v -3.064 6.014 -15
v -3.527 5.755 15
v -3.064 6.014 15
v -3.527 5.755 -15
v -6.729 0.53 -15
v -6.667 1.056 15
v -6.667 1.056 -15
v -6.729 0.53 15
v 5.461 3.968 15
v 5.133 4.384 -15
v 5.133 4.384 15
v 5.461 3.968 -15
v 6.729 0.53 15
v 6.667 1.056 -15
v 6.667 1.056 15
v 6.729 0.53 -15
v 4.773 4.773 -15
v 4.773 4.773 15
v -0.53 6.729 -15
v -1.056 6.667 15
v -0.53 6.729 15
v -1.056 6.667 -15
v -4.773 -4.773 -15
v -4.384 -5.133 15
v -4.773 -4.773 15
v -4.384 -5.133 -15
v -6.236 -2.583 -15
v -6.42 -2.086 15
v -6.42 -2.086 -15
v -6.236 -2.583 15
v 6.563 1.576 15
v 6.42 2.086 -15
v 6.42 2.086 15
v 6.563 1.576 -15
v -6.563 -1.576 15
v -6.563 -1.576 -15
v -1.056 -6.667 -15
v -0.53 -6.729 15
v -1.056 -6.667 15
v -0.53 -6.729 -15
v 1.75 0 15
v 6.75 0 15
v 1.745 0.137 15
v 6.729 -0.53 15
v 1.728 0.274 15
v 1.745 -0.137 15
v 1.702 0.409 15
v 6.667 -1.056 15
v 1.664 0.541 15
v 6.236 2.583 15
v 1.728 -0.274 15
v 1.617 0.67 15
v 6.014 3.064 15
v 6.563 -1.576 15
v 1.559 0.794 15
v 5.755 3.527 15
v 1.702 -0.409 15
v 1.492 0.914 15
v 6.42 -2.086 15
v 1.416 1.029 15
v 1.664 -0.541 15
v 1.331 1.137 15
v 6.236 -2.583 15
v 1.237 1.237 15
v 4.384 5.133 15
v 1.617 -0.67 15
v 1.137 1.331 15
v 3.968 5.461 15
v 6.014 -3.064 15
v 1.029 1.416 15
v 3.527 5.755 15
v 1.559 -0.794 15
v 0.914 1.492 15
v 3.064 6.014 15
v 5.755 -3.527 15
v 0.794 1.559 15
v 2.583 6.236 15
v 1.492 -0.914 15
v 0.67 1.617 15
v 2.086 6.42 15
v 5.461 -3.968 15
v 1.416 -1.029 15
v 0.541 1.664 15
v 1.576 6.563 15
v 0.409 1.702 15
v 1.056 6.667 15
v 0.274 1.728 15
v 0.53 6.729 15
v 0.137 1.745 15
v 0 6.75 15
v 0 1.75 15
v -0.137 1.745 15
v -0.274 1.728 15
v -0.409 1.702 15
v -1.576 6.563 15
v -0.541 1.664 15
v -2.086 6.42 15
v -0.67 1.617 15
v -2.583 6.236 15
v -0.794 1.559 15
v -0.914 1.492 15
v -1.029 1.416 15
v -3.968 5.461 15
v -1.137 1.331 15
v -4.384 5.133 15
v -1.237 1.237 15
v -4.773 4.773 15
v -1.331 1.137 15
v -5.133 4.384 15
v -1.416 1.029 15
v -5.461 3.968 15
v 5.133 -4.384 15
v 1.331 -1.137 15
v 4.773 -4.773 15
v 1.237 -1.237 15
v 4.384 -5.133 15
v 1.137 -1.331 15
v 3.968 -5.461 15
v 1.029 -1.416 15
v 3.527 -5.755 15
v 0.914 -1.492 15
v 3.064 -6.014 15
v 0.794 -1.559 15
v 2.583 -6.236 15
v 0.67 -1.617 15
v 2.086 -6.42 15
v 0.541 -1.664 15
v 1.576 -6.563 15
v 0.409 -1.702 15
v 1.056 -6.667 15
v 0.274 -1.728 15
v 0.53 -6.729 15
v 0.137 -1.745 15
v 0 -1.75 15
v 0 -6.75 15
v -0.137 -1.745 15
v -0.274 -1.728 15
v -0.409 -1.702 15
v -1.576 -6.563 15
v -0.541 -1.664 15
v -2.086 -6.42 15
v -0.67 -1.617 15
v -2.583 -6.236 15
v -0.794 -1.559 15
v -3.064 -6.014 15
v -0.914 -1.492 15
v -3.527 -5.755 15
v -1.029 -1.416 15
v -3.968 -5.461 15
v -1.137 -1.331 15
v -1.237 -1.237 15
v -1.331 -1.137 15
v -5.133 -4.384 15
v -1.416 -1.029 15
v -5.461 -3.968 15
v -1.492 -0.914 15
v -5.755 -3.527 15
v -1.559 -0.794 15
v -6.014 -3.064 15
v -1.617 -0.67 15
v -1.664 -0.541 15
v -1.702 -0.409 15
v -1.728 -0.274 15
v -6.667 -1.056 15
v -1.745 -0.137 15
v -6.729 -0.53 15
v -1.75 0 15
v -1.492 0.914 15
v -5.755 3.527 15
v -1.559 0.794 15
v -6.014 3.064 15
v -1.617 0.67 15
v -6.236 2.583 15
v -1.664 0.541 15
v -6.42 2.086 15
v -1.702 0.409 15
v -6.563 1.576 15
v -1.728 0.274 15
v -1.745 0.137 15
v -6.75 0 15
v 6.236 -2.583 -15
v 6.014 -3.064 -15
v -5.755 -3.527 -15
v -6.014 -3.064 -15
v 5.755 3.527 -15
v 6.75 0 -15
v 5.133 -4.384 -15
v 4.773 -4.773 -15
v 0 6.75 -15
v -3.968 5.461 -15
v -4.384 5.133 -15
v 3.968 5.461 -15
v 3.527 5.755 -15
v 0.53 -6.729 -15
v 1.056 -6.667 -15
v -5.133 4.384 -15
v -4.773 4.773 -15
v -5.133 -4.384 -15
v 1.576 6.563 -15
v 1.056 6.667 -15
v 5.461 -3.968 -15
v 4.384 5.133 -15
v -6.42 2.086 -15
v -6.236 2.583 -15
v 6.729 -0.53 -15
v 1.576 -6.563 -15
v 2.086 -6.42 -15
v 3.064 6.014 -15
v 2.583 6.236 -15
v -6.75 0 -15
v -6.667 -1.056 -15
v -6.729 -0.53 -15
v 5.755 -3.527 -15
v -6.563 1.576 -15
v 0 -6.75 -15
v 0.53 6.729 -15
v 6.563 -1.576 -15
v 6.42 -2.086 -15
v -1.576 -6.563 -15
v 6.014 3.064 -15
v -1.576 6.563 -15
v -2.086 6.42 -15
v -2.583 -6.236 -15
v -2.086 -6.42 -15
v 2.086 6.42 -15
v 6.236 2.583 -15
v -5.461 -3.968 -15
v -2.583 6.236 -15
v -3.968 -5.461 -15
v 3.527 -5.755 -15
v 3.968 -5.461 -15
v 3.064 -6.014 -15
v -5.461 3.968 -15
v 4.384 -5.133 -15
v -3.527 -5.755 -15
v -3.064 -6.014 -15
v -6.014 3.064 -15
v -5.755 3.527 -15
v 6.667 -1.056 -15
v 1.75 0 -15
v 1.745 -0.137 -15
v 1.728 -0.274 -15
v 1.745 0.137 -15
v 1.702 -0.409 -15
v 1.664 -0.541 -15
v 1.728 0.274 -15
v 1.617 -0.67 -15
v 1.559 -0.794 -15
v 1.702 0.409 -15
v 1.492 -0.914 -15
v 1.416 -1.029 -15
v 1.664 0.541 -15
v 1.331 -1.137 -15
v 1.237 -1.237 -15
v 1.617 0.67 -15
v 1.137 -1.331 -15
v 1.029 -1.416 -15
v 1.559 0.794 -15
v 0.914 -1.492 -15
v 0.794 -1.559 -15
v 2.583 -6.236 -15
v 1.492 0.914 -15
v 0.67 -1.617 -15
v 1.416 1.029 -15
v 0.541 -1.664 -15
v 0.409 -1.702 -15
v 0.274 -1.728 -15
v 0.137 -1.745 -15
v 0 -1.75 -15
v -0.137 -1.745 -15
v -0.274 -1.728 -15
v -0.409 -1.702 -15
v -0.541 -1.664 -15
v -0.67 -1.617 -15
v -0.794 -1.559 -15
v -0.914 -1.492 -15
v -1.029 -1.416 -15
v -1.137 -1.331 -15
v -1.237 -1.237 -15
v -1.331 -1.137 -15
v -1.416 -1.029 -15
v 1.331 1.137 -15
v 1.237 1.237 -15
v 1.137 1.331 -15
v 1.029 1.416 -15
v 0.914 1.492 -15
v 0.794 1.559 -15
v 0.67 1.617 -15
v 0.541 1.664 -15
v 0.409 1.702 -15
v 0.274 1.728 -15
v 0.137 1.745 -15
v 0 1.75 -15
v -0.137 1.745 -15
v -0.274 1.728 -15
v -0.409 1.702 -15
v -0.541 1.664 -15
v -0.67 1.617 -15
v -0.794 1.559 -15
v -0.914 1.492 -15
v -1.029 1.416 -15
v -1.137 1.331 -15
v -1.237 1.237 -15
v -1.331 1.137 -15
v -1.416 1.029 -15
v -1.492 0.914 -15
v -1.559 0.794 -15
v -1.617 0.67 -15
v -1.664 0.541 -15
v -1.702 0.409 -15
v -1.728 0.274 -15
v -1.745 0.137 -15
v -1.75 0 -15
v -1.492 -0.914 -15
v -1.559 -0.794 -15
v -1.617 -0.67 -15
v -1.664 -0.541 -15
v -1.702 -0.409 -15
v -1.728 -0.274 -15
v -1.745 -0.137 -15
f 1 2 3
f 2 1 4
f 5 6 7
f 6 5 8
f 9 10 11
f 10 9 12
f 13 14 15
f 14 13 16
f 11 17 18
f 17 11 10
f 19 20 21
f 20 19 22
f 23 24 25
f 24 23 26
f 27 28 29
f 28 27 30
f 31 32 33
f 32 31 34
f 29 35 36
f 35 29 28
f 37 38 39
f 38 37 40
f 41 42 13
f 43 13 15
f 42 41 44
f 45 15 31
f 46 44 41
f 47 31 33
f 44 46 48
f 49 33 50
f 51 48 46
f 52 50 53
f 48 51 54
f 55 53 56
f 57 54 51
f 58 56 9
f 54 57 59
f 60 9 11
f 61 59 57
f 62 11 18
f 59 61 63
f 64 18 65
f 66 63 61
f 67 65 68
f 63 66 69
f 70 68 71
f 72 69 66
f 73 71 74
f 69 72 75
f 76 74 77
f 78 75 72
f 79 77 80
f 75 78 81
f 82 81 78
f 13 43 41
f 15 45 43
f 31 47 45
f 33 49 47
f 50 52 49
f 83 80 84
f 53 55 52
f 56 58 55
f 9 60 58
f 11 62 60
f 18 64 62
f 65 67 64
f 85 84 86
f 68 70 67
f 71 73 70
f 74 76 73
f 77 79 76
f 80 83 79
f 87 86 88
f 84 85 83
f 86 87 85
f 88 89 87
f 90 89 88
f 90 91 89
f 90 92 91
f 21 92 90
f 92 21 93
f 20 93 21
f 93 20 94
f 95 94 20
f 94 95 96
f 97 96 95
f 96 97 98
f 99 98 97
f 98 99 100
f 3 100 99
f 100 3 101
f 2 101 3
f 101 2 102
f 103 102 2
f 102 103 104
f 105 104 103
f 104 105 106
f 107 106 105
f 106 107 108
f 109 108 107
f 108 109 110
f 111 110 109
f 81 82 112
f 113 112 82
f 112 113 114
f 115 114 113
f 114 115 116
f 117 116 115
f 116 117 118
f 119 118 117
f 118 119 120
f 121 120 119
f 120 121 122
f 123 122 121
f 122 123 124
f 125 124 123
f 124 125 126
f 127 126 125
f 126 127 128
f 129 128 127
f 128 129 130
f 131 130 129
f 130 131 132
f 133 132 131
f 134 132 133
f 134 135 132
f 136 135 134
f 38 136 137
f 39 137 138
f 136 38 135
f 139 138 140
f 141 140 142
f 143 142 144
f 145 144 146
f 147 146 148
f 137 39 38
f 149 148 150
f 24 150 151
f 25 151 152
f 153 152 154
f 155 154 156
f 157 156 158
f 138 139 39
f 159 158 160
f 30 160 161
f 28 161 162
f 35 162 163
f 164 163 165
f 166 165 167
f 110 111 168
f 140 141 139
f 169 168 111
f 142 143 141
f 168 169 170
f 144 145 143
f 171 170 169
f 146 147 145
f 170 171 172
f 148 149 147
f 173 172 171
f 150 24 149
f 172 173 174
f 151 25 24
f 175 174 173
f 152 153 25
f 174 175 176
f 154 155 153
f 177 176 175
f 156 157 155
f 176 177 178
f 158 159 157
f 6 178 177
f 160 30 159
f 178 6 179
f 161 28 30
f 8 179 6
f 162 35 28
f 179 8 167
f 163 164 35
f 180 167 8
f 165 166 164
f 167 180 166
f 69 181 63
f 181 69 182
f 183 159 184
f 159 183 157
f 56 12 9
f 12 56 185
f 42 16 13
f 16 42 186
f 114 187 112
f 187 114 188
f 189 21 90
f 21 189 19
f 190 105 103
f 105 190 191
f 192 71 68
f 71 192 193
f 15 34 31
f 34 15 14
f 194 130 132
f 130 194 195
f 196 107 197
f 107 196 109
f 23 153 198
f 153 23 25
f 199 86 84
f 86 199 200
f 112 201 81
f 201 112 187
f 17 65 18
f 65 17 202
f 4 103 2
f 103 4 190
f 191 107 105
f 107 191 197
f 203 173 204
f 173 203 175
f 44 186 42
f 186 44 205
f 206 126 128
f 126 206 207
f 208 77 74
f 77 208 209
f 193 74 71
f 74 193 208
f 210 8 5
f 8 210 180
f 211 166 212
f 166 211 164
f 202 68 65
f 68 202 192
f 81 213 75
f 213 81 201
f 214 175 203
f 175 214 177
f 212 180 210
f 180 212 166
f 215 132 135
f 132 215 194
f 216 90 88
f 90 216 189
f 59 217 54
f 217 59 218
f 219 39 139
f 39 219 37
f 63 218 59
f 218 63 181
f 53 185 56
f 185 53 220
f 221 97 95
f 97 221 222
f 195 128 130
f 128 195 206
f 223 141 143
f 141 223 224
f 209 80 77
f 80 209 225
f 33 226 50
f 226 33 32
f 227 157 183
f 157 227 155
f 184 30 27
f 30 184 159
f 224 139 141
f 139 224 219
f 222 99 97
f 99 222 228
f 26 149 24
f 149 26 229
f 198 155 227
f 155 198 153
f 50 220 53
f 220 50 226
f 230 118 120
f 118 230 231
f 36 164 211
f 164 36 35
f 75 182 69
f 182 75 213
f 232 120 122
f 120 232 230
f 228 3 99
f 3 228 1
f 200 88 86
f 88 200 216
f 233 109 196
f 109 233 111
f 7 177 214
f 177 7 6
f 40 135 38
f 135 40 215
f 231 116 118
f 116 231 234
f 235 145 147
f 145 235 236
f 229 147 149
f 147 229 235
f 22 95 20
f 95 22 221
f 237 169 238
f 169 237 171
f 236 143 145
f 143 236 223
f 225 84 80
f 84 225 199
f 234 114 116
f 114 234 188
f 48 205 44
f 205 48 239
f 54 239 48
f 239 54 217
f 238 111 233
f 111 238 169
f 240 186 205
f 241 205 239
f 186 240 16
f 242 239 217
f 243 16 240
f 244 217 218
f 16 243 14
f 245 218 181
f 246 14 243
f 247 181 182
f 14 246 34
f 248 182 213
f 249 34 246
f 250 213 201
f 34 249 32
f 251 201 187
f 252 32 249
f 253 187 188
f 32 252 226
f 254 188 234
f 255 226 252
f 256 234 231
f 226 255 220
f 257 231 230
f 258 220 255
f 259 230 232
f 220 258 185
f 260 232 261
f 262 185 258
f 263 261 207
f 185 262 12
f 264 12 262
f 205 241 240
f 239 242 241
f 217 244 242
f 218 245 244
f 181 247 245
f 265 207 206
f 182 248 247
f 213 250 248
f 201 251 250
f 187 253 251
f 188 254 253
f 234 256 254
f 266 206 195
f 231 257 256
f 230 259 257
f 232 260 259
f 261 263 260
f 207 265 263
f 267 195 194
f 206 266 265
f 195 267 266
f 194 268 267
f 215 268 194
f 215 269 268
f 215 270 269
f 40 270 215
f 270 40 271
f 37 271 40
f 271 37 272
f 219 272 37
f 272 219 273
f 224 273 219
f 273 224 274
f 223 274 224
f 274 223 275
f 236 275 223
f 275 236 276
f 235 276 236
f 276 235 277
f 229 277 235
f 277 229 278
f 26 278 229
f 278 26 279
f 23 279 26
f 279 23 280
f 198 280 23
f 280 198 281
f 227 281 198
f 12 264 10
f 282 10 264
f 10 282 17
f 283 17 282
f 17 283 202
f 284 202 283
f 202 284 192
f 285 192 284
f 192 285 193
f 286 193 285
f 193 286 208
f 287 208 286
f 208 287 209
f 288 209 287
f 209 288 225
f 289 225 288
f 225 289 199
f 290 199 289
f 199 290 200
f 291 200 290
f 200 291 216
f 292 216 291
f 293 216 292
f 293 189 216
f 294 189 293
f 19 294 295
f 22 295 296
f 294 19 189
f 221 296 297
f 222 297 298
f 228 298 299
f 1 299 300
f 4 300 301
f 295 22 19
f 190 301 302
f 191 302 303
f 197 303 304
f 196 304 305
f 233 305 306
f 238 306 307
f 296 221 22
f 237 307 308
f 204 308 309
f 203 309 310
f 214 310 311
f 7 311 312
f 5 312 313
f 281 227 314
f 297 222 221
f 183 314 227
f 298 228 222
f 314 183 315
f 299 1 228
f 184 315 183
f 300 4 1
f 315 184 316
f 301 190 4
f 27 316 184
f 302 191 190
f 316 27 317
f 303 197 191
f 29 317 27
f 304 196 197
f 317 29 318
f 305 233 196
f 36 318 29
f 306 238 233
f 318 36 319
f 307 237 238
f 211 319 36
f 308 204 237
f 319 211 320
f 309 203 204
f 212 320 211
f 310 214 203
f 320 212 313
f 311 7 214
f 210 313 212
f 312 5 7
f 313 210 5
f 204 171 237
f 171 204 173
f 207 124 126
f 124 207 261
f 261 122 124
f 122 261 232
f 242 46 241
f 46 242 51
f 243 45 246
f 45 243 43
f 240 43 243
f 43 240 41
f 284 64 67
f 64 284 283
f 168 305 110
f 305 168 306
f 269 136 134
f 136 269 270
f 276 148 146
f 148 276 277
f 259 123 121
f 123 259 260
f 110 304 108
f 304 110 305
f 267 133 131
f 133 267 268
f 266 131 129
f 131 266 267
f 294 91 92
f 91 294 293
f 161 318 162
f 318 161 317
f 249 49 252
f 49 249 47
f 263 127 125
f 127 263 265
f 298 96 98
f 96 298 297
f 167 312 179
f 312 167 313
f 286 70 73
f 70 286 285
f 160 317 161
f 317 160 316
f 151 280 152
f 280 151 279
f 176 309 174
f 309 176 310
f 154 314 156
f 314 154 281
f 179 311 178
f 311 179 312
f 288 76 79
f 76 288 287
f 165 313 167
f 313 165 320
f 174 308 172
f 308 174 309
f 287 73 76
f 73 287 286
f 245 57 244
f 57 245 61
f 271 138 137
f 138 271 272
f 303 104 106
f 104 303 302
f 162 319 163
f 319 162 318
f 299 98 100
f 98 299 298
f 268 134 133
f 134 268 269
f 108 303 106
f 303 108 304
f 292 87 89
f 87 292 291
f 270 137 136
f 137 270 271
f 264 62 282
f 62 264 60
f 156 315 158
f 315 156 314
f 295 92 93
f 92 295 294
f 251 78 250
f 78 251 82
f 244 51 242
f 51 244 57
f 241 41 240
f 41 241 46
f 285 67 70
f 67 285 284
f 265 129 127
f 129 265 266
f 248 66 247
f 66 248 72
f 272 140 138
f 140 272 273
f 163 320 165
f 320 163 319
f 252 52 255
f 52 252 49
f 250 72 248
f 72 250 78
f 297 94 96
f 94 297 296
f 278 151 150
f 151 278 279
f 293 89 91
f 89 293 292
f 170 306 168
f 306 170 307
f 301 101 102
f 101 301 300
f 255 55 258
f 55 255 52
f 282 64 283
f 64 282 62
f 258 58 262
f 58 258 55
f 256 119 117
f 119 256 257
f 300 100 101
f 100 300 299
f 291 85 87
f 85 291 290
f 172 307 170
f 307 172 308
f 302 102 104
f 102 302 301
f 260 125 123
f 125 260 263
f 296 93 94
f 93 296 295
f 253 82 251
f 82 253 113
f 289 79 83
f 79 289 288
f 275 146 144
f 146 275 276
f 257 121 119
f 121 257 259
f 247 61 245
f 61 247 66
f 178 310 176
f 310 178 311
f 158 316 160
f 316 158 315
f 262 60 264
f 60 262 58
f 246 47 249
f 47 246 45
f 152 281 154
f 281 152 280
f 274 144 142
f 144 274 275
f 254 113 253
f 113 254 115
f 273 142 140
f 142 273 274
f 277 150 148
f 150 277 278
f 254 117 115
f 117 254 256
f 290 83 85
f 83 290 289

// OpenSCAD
bolt_thickness=3;
wall_thickness=5;
bracket_height=28;



resolution=80;

	difference(){
		union(){
 
			//outside wall
			 cylinder(r=(bolt_thickness+.5)/2+wall_thickness,h=bracket_height+2,center=true,$fn=resolution);					

		
				}	


				//inside bolt
				color ("blue")
				cylinder(r=(bolt_thickness+.5)/2,h=bracket_height+2,center=true,$fn=resolution);				
				
}
